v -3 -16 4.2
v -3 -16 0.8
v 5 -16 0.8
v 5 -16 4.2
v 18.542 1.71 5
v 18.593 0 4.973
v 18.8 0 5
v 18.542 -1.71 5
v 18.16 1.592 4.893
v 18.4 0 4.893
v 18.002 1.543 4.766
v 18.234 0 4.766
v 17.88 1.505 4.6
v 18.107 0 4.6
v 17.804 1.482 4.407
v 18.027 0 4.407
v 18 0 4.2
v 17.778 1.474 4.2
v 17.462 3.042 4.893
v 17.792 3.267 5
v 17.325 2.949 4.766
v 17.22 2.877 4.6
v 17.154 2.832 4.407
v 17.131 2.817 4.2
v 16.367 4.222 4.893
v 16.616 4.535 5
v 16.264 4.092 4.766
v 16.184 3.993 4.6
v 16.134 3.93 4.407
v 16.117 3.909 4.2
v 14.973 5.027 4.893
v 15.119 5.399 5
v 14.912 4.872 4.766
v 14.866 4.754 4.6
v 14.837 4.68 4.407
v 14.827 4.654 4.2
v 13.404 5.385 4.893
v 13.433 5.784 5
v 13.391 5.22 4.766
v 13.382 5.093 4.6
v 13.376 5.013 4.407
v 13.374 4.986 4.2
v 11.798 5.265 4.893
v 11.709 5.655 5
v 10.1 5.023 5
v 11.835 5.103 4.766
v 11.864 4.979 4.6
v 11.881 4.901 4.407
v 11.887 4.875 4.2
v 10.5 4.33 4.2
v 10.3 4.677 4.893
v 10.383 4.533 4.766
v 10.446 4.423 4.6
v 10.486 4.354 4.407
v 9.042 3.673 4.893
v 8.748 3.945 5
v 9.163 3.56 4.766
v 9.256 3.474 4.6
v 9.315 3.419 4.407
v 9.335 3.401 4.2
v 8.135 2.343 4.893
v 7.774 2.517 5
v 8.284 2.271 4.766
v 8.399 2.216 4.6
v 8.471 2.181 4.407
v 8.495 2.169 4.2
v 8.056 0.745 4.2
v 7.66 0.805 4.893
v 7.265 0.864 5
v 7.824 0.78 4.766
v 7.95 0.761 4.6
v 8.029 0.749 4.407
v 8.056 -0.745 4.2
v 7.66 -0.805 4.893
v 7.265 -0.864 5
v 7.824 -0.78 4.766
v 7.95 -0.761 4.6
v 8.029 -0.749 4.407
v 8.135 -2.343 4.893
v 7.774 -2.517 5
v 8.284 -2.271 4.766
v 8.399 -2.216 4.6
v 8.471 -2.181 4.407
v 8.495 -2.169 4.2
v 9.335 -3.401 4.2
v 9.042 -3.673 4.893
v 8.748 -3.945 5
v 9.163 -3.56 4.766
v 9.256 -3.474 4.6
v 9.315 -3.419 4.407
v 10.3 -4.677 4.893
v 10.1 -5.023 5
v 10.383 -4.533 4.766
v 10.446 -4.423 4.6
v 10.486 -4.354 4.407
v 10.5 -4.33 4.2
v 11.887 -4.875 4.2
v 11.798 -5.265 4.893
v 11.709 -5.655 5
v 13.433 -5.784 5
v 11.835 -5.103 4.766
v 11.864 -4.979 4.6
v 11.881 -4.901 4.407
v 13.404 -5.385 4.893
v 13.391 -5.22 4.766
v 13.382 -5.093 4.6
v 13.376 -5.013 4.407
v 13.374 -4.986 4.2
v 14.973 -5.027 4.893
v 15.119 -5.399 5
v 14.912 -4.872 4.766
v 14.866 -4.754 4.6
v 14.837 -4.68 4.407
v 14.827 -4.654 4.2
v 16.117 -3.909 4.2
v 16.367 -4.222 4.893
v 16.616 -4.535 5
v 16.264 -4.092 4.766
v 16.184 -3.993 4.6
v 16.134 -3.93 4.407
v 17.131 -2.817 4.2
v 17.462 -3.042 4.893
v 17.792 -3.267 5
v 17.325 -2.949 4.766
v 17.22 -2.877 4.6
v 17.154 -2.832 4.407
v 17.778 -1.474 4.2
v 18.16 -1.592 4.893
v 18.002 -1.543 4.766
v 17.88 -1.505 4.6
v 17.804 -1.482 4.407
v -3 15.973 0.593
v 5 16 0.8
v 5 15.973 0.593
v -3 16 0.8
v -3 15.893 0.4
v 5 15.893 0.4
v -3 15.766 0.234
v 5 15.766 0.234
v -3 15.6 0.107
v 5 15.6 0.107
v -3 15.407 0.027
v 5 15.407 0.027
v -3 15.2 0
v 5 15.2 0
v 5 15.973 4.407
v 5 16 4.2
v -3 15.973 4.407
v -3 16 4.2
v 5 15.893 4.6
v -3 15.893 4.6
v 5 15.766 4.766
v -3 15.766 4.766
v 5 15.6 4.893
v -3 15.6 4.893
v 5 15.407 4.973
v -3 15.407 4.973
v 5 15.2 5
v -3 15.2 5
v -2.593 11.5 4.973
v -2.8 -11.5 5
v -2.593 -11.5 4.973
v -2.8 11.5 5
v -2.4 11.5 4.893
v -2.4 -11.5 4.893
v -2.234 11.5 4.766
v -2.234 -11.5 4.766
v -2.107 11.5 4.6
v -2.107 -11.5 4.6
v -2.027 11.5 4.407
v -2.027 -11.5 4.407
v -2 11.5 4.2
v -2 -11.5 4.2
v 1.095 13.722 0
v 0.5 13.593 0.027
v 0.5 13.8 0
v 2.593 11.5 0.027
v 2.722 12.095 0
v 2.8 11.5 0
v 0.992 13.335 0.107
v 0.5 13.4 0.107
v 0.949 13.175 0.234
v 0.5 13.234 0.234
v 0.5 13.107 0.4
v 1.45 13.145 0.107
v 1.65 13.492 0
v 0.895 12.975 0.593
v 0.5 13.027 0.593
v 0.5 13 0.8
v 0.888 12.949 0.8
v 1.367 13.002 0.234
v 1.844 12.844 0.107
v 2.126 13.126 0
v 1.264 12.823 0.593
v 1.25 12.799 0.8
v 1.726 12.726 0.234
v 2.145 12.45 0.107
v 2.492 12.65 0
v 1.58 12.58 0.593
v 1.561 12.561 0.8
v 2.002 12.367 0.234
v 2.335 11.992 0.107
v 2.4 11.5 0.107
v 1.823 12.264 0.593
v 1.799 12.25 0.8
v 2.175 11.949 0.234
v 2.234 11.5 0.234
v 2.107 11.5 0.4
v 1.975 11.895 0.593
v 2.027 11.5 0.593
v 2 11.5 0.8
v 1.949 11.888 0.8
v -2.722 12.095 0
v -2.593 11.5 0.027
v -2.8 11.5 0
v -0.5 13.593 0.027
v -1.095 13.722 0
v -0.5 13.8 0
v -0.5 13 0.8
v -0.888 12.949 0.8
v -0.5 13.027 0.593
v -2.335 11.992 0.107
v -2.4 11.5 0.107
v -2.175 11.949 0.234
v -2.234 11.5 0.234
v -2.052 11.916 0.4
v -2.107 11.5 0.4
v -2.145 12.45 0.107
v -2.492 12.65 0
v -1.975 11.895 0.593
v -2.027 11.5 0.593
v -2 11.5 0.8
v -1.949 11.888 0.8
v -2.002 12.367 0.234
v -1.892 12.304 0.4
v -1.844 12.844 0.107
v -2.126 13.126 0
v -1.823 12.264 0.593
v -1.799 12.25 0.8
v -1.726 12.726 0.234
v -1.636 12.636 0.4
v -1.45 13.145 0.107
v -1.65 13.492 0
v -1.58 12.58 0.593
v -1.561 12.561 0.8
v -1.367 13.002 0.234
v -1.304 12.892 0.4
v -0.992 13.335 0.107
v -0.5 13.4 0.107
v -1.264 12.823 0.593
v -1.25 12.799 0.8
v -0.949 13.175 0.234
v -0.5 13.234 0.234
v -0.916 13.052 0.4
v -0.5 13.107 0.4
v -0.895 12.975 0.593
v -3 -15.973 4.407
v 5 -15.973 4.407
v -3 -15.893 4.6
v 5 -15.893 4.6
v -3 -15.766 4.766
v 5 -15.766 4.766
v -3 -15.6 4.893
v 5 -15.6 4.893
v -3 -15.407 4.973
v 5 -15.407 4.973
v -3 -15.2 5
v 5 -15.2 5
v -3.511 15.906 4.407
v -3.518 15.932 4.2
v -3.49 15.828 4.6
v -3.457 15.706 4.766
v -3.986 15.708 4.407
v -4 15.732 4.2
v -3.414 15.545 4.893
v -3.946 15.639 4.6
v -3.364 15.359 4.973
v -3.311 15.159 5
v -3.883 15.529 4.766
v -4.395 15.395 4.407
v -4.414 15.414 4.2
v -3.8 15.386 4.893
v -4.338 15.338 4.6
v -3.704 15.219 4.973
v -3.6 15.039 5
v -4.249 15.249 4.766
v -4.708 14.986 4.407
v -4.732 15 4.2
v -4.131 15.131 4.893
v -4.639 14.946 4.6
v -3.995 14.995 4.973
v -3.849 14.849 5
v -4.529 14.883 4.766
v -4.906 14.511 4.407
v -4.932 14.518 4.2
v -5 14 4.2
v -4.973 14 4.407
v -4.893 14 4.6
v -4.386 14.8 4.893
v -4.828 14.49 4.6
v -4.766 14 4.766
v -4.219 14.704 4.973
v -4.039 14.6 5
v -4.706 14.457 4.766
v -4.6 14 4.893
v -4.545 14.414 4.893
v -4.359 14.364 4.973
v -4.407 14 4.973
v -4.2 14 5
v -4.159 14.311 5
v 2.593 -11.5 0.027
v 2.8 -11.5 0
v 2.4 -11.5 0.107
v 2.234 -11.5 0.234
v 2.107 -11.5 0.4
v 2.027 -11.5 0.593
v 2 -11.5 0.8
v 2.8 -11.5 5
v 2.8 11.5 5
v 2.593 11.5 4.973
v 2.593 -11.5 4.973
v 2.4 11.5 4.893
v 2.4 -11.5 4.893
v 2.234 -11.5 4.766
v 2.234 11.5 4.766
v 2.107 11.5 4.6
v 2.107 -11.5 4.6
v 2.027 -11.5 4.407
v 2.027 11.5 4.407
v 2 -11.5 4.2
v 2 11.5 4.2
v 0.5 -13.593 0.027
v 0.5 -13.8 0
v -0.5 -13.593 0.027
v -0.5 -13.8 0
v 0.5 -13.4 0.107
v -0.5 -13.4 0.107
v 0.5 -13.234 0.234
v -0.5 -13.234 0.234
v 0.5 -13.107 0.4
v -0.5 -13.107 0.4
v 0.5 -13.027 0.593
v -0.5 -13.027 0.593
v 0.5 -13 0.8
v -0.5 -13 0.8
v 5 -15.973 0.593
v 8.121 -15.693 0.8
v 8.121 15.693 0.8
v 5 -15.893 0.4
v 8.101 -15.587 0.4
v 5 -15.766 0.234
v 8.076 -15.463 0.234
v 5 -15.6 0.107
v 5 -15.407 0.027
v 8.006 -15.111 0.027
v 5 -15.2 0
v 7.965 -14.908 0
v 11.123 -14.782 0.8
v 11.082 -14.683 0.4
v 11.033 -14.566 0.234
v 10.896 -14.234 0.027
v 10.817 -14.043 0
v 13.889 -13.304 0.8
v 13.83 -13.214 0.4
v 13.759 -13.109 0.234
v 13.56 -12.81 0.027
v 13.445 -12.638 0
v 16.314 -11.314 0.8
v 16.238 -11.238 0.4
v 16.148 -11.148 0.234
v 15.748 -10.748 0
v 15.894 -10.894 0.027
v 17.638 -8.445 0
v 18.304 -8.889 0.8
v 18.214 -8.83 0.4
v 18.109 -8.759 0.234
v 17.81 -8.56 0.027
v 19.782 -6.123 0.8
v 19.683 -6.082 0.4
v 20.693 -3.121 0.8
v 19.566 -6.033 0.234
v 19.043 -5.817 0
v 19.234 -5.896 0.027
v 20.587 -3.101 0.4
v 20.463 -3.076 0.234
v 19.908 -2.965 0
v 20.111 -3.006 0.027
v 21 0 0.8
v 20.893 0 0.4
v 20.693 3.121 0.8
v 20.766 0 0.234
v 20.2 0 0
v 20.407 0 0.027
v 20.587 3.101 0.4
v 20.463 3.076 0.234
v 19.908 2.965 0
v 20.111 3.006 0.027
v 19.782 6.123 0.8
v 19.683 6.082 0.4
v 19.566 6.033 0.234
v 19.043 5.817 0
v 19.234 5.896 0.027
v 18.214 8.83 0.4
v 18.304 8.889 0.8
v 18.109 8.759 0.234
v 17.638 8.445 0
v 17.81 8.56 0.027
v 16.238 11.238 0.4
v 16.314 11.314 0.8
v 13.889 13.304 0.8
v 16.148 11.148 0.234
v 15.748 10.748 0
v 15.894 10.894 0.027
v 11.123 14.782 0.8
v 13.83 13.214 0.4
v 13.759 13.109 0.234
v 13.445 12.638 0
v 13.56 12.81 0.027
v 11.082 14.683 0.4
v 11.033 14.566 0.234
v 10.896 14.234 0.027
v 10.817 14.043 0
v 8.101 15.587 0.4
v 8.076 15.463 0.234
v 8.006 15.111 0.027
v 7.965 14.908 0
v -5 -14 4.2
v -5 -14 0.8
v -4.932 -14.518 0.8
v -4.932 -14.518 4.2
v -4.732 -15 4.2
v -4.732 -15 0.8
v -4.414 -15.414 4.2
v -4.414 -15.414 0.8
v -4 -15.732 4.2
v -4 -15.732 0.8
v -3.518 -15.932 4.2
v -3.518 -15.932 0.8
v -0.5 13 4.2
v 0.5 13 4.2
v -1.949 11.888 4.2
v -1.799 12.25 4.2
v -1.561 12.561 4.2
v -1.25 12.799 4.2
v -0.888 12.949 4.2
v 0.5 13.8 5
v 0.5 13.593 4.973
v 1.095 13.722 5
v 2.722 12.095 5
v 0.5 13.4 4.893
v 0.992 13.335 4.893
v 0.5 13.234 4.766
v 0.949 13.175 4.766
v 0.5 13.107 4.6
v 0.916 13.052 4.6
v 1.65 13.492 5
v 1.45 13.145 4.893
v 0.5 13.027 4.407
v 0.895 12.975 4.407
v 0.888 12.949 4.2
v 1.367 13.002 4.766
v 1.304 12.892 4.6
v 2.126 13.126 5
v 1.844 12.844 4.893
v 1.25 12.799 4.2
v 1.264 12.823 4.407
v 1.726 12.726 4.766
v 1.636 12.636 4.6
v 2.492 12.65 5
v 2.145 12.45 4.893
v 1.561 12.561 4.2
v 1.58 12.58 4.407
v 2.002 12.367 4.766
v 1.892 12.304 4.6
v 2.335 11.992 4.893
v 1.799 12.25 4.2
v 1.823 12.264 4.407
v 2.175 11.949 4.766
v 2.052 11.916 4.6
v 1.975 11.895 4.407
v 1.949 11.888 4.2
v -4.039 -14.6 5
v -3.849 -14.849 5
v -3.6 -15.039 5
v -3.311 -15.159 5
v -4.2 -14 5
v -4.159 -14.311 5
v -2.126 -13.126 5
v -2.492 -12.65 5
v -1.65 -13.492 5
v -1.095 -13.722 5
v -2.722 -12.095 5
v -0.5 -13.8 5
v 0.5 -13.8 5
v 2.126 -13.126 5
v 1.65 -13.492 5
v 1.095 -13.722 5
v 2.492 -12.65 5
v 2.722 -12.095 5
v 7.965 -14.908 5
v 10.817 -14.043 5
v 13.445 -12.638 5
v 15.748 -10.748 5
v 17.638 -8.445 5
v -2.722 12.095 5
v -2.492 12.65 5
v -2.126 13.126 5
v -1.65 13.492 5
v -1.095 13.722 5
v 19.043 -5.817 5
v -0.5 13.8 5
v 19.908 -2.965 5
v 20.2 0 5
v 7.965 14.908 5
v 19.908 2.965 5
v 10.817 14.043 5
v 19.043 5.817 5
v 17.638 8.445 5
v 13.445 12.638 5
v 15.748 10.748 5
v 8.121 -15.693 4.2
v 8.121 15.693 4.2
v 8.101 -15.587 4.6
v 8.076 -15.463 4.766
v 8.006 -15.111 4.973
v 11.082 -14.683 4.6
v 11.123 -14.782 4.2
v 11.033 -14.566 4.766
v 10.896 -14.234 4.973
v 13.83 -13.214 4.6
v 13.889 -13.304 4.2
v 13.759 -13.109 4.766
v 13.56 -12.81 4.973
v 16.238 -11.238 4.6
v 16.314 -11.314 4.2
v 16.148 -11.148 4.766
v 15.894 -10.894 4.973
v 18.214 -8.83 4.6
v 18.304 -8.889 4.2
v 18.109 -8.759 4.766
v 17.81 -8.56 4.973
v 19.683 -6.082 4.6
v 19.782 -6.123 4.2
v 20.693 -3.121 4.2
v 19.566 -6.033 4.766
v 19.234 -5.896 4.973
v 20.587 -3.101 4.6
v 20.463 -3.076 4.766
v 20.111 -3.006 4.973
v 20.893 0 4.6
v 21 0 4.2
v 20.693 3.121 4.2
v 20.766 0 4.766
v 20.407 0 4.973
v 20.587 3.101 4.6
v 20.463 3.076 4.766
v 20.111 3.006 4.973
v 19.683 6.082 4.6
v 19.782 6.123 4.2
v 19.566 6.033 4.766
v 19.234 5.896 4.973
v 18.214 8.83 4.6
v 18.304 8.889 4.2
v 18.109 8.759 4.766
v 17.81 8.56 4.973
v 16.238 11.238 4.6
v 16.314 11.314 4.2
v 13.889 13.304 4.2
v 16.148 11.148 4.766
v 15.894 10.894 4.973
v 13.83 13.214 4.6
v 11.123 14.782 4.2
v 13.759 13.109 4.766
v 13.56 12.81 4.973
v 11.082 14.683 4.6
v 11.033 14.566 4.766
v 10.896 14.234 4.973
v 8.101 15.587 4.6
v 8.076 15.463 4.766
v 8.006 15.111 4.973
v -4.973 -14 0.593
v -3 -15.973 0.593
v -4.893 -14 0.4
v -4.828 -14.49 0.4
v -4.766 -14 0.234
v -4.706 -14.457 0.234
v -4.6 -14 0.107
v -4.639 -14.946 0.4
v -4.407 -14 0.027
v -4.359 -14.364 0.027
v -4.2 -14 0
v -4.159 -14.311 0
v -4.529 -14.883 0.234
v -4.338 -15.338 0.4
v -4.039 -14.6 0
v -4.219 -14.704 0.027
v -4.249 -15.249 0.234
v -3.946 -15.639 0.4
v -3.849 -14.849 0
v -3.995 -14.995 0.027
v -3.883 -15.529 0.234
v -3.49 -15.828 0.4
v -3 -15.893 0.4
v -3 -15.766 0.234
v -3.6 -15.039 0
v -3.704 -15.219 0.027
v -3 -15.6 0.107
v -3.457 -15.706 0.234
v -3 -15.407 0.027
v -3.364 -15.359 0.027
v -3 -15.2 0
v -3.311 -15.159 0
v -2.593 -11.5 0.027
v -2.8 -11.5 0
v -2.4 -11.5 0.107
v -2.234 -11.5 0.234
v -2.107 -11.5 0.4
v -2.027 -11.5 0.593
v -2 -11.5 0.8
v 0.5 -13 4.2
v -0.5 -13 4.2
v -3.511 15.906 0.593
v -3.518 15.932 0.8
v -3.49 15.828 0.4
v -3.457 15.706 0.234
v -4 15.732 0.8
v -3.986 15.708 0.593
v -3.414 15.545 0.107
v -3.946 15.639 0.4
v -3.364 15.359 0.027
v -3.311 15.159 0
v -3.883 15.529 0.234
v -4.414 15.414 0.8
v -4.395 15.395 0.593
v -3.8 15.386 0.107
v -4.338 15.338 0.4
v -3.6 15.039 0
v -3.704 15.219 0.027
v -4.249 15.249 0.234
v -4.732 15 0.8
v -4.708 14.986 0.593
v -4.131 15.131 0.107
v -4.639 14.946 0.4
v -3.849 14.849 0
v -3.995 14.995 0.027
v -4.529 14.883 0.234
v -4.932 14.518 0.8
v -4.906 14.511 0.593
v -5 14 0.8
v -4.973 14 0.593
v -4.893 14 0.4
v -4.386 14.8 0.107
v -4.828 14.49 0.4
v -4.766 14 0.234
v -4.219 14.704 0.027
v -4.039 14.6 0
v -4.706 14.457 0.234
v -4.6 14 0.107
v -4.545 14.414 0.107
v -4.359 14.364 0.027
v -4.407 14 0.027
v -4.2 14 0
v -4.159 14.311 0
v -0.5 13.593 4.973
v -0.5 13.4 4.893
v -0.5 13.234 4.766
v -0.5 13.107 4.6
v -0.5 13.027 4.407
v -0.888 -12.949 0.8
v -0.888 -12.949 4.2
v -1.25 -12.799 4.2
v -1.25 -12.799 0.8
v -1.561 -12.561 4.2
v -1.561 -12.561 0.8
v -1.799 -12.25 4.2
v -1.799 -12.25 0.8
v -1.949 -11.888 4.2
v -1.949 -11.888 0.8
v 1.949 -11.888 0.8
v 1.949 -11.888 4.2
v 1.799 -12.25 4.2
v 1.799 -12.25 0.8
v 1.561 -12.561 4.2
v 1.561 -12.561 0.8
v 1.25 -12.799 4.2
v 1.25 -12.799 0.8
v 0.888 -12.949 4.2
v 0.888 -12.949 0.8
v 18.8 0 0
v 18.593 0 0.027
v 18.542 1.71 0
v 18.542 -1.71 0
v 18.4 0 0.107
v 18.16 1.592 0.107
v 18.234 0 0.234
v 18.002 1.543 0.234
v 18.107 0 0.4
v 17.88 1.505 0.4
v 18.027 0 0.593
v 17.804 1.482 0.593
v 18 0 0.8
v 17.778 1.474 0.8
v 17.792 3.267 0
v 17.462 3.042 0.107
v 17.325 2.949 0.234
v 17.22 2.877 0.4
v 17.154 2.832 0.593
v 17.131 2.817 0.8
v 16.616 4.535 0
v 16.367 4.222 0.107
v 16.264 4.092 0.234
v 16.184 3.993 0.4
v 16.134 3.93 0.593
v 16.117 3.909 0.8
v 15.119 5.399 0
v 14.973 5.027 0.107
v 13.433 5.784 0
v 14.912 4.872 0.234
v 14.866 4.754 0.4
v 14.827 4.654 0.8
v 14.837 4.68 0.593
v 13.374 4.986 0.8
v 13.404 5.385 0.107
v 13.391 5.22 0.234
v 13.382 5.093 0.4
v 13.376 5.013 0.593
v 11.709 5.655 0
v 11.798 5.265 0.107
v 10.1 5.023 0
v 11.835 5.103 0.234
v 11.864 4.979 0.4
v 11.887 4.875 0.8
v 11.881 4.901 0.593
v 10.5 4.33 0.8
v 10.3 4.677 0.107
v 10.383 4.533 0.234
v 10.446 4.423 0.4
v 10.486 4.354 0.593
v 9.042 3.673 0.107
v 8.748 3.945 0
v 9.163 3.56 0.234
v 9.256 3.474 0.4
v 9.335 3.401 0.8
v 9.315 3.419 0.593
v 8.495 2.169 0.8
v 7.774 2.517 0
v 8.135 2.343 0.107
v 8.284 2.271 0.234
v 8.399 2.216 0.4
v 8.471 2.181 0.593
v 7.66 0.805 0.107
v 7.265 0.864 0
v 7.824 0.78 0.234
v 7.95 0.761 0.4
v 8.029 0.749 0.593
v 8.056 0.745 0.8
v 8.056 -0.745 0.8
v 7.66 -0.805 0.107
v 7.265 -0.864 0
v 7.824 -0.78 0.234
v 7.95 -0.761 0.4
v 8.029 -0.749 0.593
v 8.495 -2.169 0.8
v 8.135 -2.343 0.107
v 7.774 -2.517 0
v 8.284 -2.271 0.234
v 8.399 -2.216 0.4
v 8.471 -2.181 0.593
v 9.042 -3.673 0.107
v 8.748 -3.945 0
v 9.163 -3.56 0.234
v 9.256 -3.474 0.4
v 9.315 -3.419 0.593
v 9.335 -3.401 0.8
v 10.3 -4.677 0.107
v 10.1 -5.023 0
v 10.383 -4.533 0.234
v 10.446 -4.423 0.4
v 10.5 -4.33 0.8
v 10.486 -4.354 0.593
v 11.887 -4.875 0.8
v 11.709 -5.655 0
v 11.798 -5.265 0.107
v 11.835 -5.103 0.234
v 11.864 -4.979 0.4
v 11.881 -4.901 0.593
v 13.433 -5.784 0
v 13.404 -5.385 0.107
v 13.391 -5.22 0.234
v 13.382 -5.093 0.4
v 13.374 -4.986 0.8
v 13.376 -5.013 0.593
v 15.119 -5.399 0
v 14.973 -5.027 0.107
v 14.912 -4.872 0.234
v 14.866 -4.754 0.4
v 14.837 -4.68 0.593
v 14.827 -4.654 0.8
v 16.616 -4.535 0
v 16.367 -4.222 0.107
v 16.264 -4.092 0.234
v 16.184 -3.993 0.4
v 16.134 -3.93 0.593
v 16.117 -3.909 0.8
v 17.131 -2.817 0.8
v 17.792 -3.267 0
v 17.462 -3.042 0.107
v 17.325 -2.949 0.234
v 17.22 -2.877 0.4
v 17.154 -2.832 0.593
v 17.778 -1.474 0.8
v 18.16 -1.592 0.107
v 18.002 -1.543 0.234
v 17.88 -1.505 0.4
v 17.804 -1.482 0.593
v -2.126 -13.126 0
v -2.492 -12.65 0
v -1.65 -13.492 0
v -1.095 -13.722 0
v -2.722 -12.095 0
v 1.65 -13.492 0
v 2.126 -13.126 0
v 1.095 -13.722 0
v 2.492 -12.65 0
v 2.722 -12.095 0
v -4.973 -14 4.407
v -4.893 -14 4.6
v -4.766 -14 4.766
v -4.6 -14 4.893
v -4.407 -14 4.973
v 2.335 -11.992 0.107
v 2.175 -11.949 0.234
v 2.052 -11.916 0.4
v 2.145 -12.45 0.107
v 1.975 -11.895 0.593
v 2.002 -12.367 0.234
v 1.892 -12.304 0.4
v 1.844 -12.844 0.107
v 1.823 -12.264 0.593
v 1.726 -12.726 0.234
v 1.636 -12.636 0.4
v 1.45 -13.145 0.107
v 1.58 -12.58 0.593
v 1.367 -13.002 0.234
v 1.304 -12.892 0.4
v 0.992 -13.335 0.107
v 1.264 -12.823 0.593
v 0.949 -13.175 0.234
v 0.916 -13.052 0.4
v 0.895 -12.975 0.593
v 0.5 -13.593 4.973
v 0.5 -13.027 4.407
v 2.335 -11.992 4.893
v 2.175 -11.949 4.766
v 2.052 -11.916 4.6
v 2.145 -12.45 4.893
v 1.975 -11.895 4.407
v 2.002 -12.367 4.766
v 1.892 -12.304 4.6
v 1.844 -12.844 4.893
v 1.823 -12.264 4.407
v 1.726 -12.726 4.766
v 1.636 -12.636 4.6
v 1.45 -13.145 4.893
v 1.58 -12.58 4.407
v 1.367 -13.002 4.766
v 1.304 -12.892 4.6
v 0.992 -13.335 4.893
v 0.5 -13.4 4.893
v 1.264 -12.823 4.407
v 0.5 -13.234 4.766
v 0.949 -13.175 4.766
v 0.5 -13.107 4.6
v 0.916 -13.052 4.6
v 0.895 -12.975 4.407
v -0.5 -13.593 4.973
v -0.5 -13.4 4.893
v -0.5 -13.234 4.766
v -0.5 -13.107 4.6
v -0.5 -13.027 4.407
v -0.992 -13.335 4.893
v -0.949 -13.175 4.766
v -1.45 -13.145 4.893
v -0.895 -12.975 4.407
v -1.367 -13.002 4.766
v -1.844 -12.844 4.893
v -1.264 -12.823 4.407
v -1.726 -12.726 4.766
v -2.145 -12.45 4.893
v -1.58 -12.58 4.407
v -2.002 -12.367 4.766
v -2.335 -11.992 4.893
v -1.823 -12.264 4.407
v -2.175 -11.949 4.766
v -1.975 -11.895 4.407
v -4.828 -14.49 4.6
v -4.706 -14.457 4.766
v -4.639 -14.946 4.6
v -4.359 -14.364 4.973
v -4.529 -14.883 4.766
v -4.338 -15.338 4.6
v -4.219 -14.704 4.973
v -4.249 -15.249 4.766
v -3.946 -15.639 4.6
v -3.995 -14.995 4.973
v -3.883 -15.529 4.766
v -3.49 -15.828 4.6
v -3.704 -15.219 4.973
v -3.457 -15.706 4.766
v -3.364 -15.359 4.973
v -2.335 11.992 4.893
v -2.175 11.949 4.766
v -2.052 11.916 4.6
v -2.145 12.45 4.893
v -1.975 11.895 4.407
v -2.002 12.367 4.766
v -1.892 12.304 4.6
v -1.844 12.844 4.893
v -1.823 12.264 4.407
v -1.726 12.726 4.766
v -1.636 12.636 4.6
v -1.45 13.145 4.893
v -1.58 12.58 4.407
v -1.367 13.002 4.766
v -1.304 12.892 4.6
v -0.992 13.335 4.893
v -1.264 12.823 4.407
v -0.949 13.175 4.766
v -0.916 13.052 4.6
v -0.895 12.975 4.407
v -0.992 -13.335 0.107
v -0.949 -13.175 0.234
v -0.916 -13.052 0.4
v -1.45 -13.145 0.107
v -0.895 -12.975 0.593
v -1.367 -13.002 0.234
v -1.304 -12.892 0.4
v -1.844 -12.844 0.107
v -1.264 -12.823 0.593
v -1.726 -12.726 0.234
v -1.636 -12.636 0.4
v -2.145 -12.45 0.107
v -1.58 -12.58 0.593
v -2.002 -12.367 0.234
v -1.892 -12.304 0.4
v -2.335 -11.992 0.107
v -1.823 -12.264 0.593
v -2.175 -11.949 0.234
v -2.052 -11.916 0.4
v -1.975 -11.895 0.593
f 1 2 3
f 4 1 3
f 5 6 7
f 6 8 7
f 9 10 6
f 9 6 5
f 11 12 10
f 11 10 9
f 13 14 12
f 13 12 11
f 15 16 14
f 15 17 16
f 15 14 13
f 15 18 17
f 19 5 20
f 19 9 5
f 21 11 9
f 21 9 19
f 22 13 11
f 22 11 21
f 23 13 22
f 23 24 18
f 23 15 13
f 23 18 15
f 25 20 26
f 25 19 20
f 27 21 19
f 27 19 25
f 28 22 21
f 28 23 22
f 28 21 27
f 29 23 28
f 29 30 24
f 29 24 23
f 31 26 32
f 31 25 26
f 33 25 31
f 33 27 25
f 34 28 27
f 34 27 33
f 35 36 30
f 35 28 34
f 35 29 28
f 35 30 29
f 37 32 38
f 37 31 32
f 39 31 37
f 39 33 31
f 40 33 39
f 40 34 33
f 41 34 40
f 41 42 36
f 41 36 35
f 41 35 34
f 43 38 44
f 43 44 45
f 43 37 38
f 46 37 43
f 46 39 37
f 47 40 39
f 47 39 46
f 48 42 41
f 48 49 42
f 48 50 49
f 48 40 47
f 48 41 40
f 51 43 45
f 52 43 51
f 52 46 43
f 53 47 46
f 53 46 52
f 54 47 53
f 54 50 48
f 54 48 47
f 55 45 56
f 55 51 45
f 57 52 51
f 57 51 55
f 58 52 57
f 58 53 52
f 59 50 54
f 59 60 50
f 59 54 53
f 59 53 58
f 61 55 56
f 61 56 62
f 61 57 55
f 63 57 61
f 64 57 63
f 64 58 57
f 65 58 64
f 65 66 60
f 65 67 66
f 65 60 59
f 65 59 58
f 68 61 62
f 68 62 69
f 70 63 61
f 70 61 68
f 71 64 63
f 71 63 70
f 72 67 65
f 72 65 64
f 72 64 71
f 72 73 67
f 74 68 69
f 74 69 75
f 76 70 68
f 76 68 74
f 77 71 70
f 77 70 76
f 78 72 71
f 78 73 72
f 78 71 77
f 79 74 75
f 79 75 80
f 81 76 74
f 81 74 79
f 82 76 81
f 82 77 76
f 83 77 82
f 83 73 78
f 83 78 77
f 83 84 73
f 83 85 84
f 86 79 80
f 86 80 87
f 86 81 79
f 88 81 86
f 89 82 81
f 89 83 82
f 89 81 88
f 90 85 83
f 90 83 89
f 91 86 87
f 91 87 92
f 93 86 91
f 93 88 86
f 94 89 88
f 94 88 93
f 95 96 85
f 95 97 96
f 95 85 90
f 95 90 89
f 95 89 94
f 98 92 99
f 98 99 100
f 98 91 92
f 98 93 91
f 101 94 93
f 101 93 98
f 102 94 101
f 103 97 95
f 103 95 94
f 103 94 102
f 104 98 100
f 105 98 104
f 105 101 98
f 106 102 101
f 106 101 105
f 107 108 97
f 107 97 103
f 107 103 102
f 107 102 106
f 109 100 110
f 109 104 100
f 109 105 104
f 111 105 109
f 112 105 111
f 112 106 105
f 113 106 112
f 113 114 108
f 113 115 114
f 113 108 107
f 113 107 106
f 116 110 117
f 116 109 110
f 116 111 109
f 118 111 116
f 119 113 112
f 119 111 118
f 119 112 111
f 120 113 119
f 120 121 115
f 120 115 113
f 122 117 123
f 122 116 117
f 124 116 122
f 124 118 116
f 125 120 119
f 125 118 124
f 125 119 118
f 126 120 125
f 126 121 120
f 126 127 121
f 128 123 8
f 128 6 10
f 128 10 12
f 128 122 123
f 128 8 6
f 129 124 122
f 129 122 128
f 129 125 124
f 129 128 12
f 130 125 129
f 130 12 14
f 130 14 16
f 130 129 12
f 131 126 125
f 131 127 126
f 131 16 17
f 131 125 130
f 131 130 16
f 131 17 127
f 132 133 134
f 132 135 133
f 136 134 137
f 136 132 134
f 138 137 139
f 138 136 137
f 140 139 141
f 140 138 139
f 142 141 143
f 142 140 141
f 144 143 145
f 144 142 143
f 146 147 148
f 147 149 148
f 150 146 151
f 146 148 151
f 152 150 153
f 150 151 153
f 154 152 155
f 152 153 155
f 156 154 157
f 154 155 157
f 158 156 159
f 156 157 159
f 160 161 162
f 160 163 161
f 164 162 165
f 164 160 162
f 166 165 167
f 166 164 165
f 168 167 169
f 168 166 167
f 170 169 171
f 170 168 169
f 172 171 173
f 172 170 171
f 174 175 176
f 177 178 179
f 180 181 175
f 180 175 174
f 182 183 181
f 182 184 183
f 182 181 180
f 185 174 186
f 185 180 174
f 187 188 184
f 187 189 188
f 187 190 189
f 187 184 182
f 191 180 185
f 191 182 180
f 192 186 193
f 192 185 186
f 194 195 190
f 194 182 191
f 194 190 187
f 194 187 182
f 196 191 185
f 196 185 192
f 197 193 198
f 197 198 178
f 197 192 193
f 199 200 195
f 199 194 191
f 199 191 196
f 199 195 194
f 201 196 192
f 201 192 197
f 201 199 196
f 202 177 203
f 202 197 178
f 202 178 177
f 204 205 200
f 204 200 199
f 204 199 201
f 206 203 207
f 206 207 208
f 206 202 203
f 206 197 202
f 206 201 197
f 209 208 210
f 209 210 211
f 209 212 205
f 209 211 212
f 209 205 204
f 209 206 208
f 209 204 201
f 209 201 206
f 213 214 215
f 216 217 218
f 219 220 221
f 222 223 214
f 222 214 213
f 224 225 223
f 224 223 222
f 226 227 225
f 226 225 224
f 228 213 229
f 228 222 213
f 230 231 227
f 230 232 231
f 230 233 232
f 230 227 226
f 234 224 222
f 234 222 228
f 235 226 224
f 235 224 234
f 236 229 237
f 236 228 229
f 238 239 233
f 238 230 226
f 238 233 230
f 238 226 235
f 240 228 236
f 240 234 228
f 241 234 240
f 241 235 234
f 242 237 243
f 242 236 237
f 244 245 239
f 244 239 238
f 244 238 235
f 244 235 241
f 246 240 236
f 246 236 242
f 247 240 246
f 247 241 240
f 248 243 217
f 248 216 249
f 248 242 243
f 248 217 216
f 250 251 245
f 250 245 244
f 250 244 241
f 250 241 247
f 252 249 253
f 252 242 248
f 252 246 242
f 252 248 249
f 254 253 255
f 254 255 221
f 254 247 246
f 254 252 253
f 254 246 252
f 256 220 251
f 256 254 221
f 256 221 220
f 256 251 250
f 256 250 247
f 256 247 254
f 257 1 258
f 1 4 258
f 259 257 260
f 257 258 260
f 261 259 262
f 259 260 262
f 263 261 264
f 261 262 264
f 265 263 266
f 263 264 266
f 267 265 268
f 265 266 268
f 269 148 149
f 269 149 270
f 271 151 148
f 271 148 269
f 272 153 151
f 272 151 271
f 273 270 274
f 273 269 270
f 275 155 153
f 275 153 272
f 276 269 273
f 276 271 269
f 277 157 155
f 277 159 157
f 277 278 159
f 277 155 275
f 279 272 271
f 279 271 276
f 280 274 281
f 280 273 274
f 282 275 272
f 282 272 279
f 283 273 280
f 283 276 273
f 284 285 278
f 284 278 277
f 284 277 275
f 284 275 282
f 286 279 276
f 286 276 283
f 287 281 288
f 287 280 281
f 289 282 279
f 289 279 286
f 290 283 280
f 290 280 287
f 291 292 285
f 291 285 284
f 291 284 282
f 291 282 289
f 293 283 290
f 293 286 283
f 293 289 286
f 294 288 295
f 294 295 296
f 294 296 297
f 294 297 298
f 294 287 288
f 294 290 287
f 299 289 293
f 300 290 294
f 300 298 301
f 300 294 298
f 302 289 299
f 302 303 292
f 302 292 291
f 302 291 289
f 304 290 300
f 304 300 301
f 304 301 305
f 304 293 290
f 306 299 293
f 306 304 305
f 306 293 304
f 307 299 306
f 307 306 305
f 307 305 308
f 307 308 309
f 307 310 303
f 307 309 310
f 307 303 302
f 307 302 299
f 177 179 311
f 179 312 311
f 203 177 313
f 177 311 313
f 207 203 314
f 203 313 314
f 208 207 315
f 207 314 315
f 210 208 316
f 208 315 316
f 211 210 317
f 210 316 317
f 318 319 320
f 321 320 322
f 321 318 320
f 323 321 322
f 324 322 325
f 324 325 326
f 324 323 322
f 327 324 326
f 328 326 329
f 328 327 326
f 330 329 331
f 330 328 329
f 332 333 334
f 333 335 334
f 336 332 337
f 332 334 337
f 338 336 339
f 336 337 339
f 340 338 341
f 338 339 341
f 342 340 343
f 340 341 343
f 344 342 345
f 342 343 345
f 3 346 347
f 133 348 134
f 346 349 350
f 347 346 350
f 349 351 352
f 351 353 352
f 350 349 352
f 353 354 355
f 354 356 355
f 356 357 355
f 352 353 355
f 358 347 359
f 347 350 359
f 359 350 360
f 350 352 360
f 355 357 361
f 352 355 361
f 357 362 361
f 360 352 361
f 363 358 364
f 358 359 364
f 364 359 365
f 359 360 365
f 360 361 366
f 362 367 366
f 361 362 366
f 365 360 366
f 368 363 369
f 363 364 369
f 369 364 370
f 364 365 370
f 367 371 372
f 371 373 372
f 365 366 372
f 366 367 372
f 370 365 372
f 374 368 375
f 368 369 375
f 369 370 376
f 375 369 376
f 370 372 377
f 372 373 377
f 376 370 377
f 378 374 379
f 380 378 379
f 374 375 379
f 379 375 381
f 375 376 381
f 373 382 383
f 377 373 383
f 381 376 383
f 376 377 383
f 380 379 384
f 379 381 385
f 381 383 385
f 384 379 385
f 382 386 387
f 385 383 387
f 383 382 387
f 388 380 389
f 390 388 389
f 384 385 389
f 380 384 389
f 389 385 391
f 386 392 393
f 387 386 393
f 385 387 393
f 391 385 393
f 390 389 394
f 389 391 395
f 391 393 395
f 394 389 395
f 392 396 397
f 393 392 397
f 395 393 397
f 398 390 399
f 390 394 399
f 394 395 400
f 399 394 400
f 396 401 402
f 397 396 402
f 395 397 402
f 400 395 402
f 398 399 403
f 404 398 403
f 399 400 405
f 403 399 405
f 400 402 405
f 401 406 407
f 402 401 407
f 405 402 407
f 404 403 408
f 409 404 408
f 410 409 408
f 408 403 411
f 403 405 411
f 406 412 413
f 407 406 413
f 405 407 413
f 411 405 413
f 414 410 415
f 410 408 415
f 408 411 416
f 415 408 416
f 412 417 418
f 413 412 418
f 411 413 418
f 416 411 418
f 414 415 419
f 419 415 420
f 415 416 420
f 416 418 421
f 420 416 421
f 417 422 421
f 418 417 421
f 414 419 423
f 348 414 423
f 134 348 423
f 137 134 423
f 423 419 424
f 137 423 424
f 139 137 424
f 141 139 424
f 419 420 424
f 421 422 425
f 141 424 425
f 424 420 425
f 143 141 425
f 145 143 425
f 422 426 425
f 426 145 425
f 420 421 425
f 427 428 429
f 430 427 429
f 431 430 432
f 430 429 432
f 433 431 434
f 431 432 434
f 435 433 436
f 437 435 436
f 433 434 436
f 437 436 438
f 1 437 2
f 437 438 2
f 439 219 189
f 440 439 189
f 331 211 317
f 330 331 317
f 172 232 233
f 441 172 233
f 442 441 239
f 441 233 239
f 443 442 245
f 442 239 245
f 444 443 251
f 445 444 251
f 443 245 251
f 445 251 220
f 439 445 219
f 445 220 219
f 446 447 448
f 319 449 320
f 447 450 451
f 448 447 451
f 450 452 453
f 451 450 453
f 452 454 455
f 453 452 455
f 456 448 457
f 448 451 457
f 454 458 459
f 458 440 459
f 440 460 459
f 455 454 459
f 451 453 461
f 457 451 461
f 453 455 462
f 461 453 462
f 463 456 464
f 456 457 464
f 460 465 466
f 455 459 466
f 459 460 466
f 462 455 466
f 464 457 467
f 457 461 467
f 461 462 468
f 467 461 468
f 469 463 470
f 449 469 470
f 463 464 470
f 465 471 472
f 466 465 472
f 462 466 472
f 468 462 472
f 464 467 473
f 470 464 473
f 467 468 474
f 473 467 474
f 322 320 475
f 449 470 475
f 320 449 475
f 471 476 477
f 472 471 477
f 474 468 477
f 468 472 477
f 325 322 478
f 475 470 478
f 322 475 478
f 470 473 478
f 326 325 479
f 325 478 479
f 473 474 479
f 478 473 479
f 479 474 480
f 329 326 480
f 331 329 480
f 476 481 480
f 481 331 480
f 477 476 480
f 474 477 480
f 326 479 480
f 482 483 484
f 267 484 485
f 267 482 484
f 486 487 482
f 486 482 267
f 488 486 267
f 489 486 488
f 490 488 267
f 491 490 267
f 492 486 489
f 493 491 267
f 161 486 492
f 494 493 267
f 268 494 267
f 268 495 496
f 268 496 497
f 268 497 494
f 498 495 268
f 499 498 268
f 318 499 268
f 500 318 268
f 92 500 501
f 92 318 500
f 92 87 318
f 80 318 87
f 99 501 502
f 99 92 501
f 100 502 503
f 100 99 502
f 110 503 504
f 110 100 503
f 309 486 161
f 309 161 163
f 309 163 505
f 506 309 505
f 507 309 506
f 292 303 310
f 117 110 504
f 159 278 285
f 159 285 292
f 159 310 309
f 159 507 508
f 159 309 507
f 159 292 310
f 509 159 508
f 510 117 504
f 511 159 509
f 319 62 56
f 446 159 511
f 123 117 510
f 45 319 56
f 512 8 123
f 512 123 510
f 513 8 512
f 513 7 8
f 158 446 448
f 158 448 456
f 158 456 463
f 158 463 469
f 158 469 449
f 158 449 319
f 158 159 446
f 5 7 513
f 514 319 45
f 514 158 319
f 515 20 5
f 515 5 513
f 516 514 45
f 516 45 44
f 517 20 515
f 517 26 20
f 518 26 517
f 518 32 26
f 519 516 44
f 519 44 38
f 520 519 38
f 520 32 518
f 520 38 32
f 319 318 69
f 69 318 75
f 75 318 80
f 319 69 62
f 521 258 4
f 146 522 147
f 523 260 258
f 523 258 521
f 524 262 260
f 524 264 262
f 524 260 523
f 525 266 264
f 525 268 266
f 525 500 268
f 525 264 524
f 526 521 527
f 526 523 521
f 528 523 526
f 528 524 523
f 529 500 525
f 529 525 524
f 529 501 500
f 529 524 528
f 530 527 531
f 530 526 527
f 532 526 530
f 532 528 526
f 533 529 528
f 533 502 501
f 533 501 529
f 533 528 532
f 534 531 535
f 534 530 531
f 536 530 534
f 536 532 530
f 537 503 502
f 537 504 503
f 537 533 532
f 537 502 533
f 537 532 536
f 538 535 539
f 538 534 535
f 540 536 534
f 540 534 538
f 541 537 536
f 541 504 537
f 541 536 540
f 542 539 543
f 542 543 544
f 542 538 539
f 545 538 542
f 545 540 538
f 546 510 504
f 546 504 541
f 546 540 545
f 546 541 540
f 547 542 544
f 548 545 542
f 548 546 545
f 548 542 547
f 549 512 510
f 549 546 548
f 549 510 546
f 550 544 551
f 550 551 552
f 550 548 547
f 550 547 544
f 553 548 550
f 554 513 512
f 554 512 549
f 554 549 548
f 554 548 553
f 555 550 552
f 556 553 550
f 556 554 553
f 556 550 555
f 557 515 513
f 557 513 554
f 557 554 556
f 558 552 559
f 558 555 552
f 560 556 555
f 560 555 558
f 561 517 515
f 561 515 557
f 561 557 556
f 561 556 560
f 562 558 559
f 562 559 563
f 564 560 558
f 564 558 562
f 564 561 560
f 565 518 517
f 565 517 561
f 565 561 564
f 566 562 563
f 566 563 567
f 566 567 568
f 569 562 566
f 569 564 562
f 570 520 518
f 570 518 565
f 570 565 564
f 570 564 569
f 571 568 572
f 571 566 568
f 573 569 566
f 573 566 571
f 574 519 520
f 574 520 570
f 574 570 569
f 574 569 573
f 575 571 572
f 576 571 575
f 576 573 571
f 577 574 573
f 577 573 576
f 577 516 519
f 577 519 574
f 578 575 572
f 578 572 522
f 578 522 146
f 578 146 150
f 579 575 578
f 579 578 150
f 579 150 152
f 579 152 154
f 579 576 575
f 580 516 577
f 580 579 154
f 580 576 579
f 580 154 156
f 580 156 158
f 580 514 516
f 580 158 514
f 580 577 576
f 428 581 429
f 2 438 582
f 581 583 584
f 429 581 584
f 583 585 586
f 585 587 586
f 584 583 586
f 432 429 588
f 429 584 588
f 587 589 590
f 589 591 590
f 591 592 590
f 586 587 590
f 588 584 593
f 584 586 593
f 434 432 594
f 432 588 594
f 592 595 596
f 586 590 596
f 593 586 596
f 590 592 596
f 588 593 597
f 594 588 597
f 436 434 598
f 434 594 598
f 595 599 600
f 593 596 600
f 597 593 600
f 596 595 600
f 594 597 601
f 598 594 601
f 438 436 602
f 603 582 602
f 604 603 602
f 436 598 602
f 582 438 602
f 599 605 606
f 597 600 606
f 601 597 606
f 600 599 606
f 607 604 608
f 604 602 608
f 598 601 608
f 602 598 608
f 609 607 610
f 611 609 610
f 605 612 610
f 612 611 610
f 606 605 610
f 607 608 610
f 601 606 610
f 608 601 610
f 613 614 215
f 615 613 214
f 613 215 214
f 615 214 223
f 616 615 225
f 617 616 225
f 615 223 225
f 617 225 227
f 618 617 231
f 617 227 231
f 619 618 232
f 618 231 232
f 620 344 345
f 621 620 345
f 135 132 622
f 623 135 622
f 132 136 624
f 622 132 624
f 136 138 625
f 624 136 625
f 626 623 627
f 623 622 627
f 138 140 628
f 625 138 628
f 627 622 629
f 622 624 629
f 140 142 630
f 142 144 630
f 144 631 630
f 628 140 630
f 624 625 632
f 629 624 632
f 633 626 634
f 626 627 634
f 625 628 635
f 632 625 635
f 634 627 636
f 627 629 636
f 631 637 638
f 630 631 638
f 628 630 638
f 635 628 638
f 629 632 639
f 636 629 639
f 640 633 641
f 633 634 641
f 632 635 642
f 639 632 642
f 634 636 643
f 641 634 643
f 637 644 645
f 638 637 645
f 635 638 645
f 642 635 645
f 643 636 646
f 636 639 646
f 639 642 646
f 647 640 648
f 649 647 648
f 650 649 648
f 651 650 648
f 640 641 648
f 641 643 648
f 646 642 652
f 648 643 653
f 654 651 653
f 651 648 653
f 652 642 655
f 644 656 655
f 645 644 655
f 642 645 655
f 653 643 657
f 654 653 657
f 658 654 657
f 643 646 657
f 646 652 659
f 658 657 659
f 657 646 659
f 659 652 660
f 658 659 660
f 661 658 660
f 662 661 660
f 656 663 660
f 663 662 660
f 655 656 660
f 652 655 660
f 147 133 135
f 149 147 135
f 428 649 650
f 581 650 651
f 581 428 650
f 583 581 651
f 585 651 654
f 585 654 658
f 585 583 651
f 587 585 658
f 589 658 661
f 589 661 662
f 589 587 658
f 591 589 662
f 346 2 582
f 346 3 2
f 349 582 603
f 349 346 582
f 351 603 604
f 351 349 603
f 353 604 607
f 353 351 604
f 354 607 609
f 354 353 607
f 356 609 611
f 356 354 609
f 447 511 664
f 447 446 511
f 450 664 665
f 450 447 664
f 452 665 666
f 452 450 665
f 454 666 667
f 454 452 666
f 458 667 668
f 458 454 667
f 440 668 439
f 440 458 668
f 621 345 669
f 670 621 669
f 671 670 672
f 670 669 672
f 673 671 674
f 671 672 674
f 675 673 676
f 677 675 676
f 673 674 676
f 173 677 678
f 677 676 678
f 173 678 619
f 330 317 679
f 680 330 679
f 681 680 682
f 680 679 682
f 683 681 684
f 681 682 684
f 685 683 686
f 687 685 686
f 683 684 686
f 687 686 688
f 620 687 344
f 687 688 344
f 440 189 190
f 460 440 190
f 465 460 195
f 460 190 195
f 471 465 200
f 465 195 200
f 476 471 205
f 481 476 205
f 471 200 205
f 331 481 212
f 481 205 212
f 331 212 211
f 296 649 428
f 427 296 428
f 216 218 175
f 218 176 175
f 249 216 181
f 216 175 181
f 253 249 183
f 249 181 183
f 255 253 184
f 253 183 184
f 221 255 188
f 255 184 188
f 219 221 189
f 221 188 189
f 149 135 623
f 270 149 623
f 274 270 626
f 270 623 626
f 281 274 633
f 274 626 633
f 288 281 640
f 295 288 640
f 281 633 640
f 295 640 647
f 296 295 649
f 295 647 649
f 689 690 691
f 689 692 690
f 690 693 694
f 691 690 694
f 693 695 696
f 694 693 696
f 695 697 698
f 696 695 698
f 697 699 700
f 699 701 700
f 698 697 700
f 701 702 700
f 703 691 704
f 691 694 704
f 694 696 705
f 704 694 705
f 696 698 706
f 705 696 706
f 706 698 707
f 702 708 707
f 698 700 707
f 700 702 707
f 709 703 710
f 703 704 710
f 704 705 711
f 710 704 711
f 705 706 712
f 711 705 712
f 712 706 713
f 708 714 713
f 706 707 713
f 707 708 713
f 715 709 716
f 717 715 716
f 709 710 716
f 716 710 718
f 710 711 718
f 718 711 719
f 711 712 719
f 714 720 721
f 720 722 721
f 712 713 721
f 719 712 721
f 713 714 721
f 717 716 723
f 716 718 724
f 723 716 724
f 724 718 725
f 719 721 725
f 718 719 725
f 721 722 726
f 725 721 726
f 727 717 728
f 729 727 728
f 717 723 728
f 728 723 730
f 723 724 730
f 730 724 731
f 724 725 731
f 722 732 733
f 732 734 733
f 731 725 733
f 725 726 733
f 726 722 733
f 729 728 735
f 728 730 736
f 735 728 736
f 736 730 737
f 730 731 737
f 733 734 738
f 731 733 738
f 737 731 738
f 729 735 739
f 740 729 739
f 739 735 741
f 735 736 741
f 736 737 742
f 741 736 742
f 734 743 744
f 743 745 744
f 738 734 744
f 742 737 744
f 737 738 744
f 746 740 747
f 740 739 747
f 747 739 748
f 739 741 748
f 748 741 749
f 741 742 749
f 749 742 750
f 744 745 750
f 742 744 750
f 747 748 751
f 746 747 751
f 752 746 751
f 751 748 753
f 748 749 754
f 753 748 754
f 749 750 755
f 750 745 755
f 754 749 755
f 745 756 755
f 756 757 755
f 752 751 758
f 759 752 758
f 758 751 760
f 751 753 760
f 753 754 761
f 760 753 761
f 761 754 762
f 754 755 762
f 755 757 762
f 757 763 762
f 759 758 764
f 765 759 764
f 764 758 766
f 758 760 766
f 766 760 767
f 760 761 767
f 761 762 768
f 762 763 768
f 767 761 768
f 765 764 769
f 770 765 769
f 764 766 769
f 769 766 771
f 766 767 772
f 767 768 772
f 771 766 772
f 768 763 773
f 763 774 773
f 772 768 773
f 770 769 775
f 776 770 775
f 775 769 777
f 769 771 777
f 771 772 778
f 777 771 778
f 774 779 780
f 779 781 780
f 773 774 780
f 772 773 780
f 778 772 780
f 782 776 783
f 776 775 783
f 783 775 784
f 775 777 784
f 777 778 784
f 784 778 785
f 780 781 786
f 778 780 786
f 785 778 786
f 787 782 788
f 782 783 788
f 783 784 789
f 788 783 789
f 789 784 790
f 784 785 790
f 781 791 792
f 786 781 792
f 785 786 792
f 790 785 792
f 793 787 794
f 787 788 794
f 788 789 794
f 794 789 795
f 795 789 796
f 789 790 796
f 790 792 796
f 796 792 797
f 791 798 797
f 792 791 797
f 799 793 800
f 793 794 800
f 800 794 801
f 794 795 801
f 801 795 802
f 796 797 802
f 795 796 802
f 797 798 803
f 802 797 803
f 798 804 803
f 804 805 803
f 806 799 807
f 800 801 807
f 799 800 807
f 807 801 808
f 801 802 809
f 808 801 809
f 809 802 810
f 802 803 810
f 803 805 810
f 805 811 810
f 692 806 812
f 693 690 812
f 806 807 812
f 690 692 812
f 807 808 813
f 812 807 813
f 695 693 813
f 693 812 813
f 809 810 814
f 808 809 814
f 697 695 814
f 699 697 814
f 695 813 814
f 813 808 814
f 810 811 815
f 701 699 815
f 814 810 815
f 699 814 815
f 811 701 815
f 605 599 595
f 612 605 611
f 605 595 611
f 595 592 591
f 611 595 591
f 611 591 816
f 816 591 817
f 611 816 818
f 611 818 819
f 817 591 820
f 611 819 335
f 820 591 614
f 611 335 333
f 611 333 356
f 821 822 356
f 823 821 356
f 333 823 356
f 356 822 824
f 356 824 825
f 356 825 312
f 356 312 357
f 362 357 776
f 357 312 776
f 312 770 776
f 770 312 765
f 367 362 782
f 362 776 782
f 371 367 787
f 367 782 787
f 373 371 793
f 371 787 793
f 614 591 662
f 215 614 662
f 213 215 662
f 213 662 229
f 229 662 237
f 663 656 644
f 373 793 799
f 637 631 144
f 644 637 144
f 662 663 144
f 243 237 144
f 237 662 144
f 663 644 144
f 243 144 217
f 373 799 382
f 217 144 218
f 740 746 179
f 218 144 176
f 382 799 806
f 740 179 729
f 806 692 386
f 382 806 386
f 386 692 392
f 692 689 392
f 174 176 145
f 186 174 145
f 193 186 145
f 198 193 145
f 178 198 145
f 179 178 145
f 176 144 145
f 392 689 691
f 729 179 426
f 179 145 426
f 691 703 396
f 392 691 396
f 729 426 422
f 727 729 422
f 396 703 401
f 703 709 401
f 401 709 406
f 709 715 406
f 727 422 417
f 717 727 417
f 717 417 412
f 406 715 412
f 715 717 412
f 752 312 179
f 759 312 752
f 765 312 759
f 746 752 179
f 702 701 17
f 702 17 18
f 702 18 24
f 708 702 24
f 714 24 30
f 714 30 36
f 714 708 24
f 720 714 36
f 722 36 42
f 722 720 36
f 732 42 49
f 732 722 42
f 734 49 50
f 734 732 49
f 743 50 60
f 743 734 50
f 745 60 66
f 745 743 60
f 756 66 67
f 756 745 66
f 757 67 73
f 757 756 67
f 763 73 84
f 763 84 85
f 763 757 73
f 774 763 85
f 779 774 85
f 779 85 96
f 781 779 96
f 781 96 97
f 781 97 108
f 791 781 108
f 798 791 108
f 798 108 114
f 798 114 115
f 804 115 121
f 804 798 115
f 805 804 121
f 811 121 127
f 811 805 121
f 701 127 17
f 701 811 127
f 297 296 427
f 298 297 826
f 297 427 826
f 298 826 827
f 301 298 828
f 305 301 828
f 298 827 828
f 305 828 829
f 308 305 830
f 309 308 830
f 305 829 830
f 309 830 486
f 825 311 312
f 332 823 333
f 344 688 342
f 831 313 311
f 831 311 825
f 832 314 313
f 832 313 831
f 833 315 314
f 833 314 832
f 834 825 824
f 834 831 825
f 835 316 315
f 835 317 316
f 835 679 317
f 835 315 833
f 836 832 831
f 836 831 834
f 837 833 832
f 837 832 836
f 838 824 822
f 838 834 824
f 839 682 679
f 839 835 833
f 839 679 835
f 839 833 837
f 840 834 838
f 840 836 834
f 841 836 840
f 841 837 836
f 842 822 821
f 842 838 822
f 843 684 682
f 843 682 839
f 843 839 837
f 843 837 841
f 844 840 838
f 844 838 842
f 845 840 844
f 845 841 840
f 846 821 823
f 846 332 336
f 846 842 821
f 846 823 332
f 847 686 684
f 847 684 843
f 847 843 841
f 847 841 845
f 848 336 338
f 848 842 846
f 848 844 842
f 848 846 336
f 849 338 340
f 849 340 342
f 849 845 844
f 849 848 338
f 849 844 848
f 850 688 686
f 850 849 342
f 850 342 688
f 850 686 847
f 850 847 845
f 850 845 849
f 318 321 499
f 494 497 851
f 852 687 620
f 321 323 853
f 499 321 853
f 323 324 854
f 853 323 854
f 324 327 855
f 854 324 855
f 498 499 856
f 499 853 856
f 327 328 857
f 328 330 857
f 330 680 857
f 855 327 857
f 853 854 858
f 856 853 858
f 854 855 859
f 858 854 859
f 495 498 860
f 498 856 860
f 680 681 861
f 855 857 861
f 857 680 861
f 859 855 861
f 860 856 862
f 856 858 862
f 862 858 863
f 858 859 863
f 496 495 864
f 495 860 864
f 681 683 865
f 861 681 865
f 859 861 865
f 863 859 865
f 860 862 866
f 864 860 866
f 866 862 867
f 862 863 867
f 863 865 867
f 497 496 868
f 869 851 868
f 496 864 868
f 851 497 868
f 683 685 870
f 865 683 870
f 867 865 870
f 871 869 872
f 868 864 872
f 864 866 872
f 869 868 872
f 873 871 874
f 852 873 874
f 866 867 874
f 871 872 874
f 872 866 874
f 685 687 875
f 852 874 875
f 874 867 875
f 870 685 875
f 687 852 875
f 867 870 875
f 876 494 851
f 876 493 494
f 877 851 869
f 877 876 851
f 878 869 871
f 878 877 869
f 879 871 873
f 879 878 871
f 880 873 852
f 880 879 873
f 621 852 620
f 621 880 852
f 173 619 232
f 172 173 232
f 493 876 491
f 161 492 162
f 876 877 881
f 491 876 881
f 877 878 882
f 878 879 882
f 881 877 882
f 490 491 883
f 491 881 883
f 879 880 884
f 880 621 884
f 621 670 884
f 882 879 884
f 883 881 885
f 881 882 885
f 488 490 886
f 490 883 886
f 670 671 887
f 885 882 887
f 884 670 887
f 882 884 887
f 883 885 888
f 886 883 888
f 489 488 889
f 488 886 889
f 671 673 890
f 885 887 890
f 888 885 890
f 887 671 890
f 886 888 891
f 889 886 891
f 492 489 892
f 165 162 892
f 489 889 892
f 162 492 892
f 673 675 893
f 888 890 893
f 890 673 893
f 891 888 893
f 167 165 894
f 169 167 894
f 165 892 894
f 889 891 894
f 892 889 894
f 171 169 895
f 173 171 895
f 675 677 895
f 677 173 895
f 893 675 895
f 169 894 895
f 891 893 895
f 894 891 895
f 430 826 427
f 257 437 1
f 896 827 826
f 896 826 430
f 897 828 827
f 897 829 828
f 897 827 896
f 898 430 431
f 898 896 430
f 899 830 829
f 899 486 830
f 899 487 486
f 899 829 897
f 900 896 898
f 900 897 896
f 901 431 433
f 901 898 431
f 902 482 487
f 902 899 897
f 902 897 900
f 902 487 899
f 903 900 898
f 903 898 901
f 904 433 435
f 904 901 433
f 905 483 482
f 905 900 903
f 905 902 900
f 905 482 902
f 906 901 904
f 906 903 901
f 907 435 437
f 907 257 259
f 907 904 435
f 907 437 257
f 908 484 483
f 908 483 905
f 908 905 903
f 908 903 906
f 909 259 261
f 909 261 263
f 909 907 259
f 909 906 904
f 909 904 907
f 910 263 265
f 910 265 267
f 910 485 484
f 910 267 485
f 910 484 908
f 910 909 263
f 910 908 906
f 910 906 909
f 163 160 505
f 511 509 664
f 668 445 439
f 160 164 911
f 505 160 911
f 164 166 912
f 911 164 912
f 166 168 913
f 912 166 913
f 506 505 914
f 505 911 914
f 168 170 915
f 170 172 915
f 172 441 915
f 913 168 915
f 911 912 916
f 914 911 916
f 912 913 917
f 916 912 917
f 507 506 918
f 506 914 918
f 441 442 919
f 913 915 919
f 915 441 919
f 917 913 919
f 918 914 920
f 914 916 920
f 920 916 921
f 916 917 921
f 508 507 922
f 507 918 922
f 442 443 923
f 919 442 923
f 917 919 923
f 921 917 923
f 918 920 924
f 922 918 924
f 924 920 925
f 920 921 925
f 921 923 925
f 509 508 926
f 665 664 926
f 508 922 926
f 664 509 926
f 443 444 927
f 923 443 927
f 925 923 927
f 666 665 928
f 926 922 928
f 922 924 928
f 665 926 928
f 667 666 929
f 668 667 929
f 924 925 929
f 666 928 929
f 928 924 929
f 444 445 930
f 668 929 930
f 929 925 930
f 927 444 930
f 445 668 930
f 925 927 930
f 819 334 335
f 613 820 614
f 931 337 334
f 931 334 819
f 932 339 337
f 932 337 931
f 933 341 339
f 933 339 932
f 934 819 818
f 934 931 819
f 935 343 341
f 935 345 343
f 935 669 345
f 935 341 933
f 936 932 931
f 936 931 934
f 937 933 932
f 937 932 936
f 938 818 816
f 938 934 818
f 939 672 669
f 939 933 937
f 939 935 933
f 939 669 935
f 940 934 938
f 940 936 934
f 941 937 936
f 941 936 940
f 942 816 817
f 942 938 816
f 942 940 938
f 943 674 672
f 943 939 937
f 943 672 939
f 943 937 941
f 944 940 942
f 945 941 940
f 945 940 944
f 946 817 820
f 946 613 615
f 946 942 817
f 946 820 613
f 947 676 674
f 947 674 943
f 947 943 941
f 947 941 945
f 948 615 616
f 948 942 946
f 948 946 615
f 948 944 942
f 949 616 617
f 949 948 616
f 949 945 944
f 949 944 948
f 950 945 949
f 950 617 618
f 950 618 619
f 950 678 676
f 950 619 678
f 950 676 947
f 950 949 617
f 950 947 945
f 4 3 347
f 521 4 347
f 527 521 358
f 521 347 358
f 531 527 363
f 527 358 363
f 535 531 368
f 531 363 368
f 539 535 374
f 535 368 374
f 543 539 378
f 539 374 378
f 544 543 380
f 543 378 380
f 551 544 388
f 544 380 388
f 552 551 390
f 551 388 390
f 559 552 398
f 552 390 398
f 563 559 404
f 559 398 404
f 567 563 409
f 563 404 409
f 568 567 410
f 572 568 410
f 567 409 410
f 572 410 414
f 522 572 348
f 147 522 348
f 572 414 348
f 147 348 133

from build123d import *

# Parameters (mm, degrees)
F0_R     = 5
F1_DEPTH = 5
F2_R     = 0.8
F3_R     = 0.8


with BuildPart() as f1:
    # F0 (on Top) → F1 (new body)
    with BuildSketch(Plane.XY):
        with BuildLine():
            Line((5, -16), (5, 16))
            Line((5, 16), (-3, 16))
            ThreePointArc((-3, 16), (-4.414214, 15.414214), (-5, 14))
            Line((-5, 14), (-5, -14))
            ThreePointArc((-5, -14), (-4.414214, -15.414214), (-3, -16))
            Line((-3, -16), (5, -16))
        make_face()
        with BuildLine():
            Line((0.5, -13), (-0.5, -13))
            ThreePointArc((-0.5, -13), (-1.56066, -12.56066), (-2, -11.5))
            Line((-2, -11.5), (-2, 11.5))
            ThreePointArc((-2, 11.5), (-1.56066, 12.56066), (-0.5, 13))
            Line((-0.5, 13), (0.5, 13))
            ThreePointArc((0.5, 13), (1.56066, 12.56066), (2, 11.5))
            Line((2, 11.5), (2, -11.5))
            ThreePointArc((2, -11.5), (1.56066, -12.56066), (0.5, -13))
        make_face(mode=Mode.SUBTRACT)
        with BuildLine():
            ThreePointArc((5, -16), (21, 0), (5, 16))
            Line((5, 16), (5, -16))
        make_face()
        with Locations((13, 0)):
            Circle(F0_R, mode=Mode.SUBTRACT)
    extrude(amount=F1_DEPTH)

    # F2
    f2_edges = [f1.edges().sort_by_distance(p)[0] for p in [
        (-5, 0, 5),
        (21, 0, 0),
    ]]
    fillet(f2_edges, radius=F2_R)

    # F3
    f3_edges = [f1.edges().sort_by_distance(p)[0] for p in [
        (-2, 0, 5),
        (8, 0, 5),
        (2, 0, 0),
        (8, 0, 0),
    ]]
    fillet(f3_edges, radius=F3_R)


solid = f1.part
